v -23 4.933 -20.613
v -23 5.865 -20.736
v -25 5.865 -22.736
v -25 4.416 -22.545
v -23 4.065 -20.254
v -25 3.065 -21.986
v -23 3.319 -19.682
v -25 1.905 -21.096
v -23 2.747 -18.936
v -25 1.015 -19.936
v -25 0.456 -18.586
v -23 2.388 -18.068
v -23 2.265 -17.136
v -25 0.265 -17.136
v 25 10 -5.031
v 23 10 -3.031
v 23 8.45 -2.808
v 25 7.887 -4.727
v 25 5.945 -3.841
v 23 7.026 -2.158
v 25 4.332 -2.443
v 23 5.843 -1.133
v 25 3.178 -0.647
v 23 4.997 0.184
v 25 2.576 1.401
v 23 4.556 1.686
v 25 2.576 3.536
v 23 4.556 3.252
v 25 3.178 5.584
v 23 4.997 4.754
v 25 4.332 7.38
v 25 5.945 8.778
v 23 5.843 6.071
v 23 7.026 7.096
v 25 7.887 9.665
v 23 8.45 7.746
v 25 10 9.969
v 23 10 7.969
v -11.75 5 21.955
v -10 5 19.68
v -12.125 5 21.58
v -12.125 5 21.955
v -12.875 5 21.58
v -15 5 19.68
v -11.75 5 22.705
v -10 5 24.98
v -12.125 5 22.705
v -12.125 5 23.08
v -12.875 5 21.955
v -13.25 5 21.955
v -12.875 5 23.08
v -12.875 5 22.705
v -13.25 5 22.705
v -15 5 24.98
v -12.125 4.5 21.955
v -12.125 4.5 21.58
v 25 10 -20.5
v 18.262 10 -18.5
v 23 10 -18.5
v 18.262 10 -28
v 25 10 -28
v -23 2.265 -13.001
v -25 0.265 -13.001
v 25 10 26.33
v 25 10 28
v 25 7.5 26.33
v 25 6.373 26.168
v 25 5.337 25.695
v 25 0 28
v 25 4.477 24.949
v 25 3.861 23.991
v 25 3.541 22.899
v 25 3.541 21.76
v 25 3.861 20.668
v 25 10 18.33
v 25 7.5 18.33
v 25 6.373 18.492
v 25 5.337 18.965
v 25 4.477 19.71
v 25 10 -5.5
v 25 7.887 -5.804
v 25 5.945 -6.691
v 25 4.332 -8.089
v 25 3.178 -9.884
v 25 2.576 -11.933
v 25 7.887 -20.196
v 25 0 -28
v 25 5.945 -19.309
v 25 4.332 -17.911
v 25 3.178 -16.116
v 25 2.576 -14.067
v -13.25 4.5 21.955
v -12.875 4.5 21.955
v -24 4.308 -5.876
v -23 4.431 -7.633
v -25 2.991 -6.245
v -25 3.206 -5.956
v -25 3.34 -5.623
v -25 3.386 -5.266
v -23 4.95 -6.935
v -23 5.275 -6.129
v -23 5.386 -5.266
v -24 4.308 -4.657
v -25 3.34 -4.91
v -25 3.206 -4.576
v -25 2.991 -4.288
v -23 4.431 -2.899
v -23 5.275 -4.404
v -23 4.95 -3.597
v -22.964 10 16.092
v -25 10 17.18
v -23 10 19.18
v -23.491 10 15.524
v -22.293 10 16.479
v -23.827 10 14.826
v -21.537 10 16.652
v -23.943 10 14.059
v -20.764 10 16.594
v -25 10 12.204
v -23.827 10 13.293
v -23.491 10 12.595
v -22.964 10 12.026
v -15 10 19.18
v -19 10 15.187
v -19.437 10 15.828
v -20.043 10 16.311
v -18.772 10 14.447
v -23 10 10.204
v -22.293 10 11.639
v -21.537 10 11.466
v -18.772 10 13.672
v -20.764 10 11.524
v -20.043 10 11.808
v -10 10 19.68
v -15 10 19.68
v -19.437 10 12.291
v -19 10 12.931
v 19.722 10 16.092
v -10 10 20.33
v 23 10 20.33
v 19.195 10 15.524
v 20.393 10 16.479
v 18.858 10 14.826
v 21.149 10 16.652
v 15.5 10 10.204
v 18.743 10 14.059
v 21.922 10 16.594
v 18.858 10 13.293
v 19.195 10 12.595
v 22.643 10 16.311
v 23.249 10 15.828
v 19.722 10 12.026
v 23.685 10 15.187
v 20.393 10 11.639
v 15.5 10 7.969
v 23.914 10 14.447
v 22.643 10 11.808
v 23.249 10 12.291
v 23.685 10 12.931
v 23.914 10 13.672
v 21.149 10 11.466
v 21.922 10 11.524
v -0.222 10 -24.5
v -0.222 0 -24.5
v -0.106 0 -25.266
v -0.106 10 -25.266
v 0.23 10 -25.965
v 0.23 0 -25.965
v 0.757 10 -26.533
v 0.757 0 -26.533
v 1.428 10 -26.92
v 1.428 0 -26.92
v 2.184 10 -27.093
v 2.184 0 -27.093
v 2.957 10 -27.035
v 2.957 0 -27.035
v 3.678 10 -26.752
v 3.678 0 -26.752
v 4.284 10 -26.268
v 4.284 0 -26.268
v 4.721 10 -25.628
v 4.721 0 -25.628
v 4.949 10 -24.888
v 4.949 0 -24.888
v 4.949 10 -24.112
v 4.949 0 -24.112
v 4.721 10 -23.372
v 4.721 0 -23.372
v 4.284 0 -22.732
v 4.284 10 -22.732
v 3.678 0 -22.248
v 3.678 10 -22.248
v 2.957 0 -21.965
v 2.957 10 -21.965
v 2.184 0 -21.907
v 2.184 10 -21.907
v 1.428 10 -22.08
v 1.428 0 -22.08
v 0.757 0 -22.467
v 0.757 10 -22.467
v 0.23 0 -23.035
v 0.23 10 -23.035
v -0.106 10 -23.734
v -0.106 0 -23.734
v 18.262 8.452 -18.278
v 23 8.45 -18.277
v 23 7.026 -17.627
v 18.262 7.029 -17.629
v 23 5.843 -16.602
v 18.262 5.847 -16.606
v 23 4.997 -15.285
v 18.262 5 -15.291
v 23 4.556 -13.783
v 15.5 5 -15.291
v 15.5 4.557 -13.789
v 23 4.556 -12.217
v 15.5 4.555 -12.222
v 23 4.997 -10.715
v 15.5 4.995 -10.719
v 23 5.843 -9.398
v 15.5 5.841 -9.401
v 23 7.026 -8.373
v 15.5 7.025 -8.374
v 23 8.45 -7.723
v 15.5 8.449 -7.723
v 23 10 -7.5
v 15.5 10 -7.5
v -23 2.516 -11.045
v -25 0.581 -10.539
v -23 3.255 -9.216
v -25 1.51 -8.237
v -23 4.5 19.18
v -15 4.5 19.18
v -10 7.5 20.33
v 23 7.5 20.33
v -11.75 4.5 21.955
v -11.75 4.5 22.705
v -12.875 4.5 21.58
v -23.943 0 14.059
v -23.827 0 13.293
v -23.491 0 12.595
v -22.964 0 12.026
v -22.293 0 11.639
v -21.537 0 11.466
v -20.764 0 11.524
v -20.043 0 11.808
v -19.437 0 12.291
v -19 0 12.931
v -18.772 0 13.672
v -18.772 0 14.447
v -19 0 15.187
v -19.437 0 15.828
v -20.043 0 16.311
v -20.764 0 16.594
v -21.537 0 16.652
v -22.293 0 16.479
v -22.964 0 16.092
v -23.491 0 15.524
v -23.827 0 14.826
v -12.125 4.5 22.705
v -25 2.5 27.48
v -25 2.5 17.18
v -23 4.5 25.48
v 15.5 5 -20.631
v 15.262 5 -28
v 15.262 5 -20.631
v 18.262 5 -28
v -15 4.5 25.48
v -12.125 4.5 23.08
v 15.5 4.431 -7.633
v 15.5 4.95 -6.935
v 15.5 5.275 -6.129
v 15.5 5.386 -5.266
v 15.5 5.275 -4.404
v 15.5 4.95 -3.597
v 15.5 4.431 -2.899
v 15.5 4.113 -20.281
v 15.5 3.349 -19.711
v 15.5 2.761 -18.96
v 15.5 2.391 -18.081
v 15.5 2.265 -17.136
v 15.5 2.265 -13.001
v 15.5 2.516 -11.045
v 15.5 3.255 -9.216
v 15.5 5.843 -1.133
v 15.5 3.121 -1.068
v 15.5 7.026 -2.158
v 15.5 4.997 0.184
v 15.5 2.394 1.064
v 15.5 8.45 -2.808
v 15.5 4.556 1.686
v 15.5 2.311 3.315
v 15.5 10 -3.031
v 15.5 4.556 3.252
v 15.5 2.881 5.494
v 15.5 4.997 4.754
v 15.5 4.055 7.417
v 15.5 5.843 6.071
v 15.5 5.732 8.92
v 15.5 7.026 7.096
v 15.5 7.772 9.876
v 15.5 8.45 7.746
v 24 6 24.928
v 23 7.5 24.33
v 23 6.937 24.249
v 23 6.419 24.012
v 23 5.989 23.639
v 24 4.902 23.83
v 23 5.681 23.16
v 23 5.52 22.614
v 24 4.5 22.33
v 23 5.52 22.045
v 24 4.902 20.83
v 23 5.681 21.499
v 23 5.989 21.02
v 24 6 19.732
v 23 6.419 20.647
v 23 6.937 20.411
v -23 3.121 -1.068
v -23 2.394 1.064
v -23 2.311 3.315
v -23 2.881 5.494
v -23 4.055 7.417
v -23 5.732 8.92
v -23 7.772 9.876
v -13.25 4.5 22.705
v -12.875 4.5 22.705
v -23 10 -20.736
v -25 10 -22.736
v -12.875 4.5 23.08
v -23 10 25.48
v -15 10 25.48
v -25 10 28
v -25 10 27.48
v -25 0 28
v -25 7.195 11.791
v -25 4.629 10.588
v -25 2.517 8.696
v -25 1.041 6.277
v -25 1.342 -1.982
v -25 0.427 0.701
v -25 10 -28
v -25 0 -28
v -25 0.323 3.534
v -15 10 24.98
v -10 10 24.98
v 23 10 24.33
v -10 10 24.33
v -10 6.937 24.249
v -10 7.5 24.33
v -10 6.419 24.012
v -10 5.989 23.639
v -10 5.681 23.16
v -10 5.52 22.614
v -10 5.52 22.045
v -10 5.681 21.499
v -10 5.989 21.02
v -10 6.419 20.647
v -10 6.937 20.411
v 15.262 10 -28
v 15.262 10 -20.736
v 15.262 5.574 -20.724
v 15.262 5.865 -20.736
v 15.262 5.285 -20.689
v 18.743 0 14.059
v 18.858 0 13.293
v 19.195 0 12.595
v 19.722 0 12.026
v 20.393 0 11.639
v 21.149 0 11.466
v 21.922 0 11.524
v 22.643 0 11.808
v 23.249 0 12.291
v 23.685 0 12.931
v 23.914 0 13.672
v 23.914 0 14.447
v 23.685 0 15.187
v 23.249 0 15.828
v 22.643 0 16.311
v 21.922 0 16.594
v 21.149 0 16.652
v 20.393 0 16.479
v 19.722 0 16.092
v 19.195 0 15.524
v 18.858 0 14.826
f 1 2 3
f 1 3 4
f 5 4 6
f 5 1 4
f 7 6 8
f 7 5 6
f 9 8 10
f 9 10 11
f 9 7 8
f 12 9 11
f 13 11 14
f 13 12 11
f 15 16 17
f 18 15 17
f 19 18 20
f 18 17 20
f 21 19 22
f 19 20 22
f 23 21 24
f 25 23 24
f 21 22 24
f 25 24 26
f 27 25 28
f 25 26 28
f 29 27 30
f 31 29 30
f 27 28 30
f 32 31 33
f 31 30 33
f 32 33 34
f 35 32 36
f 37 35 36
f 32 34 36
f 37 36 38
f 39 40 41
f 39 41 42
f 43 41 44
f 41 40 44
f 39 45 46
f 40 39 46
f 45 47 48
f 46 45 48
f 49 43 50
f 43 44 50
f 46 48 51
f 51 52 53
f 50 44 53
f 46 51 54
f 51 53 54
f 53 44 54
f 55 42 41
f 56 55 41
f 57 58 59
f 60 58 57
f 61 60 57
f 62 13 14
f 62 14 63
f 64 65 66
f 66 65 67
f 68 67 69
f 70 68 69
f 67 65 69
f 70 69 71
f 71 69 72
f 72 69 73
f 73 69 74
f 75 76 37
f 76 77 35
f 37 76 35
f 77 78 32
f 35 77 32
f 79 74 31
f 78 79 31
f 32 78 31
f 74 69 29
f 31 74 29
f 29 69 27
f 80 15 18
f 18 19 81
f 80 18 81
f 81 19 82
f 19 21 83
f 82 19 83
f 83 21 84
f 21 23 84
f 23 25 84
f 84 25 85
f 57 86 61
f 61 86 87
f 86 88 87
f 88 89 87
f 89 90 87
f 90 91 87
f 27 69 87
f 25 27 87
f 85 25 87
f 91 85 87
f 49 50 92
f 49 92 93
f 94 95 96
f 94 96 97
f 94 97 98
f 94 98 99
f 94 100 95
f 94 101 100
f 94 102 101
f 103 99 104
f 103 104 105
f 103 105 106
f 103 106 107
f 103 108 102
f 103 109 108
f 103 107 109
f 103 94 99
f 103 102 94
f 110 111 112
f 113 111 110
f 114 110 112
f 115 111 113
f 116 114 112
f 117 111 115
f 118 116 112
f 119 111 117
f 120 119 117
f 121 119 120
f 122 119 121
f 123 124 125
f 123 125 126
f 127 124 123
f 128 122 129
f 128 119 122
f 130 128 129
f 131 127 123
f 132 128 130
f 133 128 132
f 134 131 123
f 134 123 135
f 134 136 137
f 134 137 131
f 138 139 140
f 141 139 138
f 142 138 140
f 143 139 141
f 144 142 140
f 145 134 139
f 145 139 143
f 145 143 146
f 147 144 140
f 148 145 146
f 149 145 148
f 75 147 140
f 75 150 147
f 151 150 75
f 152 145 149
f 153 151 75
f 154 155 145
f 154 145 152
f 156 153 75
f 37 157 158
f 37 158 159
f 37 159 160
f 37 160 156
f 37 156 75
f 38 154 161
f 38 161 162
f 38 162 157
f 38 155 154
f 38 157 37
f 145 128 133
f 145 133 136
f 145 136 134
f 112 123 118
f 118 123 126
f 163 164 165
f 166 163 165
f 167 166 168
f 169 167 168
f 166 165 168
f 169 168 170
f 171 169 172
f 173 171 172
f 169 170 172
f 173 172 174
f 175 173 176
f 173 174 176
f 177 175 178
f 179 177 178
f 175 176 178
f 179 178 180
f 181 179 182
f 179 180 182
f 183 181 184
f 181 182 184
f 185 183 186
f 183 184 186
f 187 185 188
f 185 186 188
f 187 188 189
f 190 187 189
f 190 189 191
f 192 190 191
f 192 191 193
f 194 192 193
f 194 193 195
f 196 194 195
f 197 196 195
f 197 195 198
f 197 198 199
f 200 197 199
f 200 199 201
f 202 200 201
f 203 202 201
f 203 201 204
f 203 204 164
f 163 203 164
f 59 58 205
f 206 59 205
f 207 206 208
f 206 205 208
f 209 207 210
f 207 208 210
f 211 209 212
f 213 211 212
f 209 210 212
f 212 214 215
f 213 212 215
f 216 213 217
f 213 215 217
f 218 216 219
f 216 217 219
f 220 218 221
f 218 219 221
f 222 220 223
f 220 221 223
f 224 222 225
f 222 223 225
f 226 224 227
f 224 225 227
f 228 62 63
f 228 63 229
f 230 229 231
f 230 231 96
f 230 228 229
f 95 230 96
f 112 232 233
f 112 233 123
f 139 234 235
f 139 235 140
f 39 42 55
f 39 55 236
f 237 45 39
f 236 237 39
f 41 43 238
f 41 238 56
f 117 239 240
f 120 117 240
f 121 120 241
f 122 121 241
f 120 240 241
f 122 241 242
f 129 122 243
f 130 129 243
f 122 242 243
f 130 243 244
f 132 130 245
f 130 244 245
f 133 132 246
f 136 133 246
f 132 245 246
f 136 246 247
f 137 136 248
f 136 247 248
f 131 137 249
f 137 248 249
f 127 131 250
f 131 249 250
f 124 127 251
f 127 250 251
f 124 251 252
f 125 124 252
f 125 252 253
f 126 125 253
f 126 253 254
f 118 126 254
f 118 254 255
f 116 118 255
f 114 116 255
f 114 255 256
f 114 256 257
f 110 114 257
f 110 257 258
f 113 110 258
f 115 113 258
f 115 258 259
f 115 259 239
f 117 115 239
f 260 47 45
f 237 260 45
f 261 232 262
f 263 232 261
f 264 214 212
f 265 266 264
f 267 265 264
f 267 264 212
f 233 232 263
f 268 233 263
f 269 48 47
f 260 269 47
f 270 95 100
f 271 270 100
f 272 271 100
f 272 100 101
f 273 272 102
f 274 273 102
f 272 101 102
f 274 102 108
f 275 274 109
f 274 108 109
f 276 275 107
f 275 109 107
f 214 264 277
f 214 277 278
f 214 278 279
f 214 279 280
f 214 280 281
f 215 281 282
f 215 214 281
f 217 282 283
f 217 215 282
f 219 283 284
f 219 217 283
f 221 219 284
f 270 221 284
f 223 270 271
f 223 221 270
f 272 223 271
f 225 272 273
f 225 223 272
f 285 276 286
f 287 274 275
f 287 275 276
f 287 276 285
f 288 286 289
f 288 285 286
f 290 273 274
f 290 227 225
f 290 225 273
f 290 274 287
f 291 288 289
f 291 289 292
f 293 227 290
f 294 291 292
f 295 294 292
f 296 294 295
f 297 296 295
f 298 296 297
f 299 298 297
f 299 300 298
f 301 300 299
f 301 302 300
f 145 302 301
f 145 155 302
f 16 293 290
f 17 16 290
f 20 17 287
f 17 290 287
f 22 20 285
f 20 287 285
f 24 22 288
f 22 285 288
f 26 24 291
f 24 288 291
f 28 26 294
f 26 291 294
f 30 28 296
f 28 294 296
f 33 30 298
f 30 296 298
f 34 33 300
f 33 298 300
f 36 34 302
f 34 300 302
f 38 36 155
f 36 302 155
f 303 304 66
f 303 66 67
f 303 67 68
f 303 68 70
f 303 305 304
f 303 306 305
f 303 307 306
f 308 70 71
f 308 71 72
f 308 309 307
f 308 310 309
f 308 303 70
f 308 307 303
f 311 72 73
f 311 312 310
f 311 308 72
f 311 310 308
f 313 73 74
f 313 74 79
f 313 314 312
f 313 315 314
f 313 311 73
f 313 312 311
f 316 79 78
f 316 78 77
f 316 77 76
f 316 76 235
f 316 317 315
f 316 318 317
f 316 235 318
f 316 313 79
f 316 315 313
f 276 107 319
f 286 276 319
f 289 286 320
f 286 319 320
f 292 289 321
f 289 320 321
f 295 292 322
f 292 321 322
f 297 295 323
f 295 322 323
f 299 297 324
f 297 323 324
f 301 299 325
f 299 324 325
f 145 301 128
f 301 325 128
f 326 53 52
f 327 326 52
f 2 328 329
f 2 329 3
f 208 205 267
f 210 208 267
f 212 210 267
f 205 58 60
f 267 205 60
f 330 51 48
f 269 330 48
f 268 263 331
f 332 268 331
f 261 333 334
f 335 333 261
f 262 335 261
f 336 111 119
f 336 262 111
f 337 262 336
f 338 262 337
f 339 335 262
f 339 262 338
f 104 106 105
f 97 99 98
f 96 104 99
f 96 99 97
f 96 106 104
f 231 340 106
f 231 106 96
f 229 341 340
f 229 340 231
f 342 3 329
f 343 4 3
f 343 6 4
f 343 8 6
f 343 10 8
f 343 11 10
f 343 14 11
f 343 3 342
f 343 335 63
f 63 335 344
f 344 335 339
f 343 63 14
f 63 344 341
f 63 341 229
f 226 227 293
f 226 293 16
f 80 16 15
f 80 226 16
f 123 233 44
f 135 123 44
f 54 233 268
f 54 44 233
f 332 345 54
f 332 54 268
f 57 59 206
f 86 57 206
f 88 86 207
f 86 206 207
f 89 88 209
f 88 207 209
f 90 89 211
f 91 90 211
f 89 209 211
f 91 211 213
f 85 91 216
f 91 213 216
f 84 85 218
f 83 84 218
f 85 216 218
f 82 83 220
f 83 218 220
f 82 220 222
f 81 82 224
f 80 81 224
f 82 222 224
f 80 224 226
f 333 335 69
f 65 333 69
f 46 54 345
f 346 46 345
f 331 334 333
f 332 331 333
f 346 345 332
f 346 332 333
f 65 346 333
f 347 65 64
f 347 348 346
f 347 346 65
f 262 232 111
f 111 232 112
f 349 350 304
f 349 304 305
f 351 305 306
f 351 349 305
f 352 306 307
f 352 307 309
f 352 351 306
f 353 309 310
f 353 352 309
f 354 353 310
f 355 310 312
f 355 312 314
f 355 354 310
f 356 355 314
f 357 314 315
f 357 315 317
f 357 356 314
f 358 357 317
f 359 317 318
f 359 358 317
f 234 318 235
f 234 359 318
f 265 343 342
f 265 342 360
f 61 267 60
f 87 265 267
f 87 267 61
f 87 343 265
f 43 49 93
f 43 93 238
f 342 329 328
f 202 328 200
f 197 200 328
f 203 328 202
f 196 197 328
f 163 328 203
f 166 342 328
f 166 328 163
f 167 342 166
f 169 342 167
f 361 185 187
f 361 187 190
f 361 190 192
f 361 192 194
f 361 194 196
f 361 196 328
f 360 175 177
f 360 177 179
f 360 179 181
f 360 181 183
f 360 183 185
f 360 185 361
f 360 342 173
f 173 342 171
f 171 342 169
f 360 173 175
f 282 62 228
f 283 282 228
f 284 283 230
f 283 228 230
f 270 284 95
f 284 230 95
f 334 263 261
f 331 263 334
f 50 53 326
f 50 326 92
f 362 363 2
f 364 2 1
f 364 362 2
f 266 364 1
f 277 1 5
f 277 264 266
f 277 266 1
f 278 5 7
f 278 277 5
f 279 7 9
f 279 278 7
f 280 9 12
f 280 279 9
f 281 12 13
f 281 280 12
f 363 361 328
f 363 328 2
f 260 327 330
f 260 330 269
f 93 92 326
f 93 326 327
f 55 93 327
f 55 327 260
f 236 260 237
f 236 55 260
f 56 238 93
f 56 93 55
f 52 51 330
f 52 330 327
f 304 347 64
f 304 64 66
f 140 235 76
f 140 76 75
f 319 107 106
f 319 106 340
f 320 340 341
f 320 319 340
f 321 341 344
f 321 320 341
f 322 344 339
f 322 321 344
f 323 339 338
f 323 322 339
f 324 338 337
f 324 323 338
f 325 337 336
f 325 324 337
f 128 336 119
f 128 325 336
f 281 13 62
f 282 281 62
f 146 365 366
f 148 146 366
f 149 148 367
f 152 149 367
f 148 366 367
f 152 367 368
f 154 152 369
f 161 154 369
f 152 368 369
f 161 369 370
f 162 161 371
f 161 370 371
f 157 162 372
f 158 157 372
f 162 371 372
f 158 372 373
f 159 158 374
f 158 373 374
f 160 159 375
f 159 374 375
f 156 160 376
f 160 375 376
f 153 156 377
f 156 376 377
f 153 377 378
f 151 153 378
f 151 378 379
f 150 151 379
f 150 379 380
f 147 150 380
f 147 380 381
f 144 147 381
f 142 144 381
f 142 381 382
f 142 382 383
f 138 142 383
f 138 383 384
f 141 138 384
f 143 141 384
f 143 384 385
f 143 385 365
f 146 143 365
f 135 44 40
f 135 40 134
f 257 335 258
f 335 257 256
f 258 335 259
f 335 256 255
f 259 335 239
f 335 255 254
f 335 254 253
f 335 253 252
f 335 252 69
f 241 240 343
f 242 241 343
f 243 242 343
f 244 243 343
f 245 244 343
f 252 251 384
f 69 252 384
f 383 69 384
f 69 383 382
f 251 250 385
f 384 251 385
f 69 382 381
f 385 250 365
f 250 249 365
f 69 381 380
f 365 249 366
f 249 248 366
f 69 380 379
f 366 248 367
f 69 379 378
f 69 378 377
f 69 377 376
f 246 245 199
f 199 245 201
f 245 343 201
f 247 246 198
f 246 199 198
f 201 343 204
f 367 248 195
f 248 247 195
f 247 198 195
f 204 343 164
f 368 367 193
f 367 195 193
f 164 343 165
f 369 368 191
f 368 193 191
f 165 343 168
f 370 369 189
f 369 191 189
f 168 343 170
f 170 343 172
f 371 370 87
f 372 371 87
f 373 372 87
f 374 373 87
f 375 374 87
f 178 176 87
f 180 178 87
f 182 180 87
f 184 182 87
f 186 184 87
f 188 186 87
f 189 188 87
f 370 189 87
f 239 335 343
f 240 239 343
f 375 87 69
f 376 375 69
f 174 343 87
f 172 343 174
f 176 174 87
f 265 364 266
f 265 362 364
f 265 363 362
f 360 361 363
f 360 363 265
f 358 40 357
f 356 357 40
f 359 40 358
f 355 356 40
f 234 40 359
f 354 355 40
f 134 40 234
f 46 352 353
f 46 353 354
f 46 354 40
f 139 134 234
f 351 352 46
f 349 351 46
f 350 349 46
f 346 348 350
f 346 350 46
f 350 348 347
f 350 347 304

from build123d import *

# Parameters (mm, degrees)
SKETCH1_W                  = 50
SKETCH1_H                  = 56
BOSS_EXTRUDE1_DEPTH        = 10
SKETCH2_R                  = 5.5
CUT_EXTRUDE1_DEPTH         = 59.172158289
CUT_EXTRUDE2_DEPTH         = 40.5
FILLET1_R                  = 3.6
F_5_2_5_2_DIAMETER_HOLE1_D = 5.2
SKETCH7_W                  = 3
SKETCH7_H                  = 29.868058684
CUT_EXTRUDE3_DEPTH         = 5
SKETCH8_W                  = 5.3
SKETCH8_H                  = 10
CUT_EXTRUDE4_DEPTH         = 15
CUT_EXTRUDE5_DEPTH         = 46.923850013
SKETCH10_W                 = 6.3
SKETCH10_H                 = 11
CUT_EXTRUDE6_DEPTH         = 10
CHAMFER1_SIZE              = 2
CHAMFER2_SIZE              = 2
SKETCH12_W                 = 1.5
SKETCH12_H                 = 0.75
SKETCH12_W_2               = 0.75
SKETCH12_H_2               = 1.5
CUT_EXTRUDE_THIN1_DEPTH    = 0.5


with BuildPart() as part:
    # Sketch1 → Boss-Extrude1 (new body)
    with BuildSketch(Plane(origin=(0, 0, 0), x_dir=(1, 0, 0), z_dir=(0, 1, 0))):
        Rectangle(SKETCH1_W, SKETCH1_H)
    extrude(amount=BOSS_EXTRUDE1_DEPTH)

    # Sketch2 → Cut-Extrude1 (cut, through all)
    with BuildSketch(Plane.ZY.offset(25)):
        with Locations((-13, 10)):
            Circle(SKETCH2_R)
        with Locations((2.468847143, 10)):
            Circle(SKETCH2_R)
    extrude(amount=-CUT_EXTRUDE1_DEPTH, mode=Mode.SUBTRACT)

    # Sketch3 → Cut-Extrude2 (cut)
    with BuildSketch(Plane.ZY.offset(25)):
        with BuildLine():
            Line((-20.736152857, 16.807330276), (-20.736152857, 2.265))
            Line((-20.736152857, 2.265), (-13.001152857, 2.265))
            ThreePointArc((-13.001152857, 2.265), (-10.106686283, 2.826974958), (-7.632806065, 4.431240918))
            ThreePointArc((-7.632806065, 4.431240918), (-5.266152857, 5.386235298), (-2.899499649, 4.431240918))
            ThreePointArc((-2.899499649, 4.431240918), (10.132273811, 8.950182537), (-1.204091668, 16.807330276))
            Line((-1.204091668, 16.807330276), (-20.736152857, 16.807330276))
        make_face()
    extrude(amount=-CUT_EXTRUDE2_DEPTH, mode=Mode.SUBTRACT)

    # Fillet1
    fillet1_edges = [part.edges().sort_by_distance(p)[0] for p in [
        (-4.75, 2.265, -20.736152857),
    ]]
    fillet(fillet1_edges, radius=FILLET1_R)

    # Ø5.2 (5.2) Diameter Hole1 (through all)
    with Locations(Plane(origin=(0, 10, 0), x_dir=(1, 0, 0), z_dir=(0, 1, 0))):
        with Locations((2.378026924, 24.5), (21.342971966, -14.059218087), (-21.342971966, -14.059218087)):
            Hole(F_5_2_5_2_DIAMETER_HOLE1_D / 2)

    # Sketch7 → Cut-Extrude3 (cut)
    with BuildSketch(Plane(origin=(0, 10, 0), x_dir=(1, 0, 0), z_dir=(0, 1, 0))):
        with Locations((16.76197527, 27.631709684)):
            Rectangle(SKETCH7_W, SKETCH7_H)
    extrude(amount=-CUT_EXTRUDE3_DEPTH, mode=Mode.SUBTRACT)

    # Sketch8 → Cut-Extrude4 (cut)
    with BuildSketch(Plane.ZY.offset(25)):
        with Locations((22.329609043, 10)):
            Rectangle(SKETCH8_W, SKETCH8_H)
    extrude(amount=-CUT_EXTRUDE4_DEPTH, mode=Mode.SUBTRACT)

    # Sketch9 → Cut-Extrude5 (cut, through all)
    with BuildSketch(Plane.ZY.offset(10)):
        with BuildLine():
            Line((24.329609043, 12.5), (24.329609043, 7.5))
            ThreePointArc((24.329609043, 7.5), (22.329609043, 5.5), (20.329609043, 7.5))
            Line((20.329609043, 7.5), (20.329609043, 12.5))
            ThreePointArc((20.329609043, 12.5), (22.329609043, 14.5), (24.329609043, 12.5))
        make_face()
    extrude(amount=-CUT_EXTRUDE5_DEPTH, mode=Mode.SUBTRACT)

    # Sketch10 → Cut-Extrude6 (cut)
    with BuildSketch(Plane.ZY.offset(25)):
        with Locations((22.329609043, 10)):
            Rectangle(SKETCH10_W, SKETCH10_H)
    extrude(amount=-CUT_EXTRUDE6_DEPTH, mode=Mode.SUBTRACT)

    # Chamfer1
    chamfer1_edges = [part.edges().sort_by_distance(p)[0] for p in [
        (-25, 7.25, 25.479609043),
        (-25, 7.25, 19.179609043),
        (-25, 4.5, 22.329609043),
        (-25, 7.9325, -20.736152857),
        (-25, 2.826974958, -10.106686283),
        (-25, 5.386235298, -5.266152857),
        (-25, 2.881208409, 5.494244849),
        (-25, 2.265, -15.068652857),
        (-25, 3.319415588, -19.681737269),
    ]]
    chamfer(chamfer1_edges, length=CHAMFER1_SIZE)

    # Chamfer2
    chamfer2_edges = [part.edges().sort_by_distance(p)[0] for p in [
        (25, 8.75, 24.329609043),
        (25, 8.75, 20.329609043),
        (25, 5.5, 22.329609043),
        (25, 4.5, -13),
        (25, 4.5, 2.468847143),
    ]]
    chamfer(chamfer2_edges, length=CHAMFER2_SIZE)

    # Sketch12 → Cut-Extrude-Thin1 (cut)
    with BuildSketch(Plane(origin=(0, 5, 0), x_dir=(1, 0, 0), z_dir=(0, 1, 0))):
        with Locations((-12.5, -22.329609043)):
            Rectangle(SKETCH12_W, SKETCH12_H)
        with Locations((-12.5, -22.329609043)):
            Rectangle(SKETCH12_W_2, SKETCH12_H_2)
    extrude(amount=-CUT_EXTRUDE_THIN1_DEPTH, mode=Mode.SUBTRACT)


solid = part.part
